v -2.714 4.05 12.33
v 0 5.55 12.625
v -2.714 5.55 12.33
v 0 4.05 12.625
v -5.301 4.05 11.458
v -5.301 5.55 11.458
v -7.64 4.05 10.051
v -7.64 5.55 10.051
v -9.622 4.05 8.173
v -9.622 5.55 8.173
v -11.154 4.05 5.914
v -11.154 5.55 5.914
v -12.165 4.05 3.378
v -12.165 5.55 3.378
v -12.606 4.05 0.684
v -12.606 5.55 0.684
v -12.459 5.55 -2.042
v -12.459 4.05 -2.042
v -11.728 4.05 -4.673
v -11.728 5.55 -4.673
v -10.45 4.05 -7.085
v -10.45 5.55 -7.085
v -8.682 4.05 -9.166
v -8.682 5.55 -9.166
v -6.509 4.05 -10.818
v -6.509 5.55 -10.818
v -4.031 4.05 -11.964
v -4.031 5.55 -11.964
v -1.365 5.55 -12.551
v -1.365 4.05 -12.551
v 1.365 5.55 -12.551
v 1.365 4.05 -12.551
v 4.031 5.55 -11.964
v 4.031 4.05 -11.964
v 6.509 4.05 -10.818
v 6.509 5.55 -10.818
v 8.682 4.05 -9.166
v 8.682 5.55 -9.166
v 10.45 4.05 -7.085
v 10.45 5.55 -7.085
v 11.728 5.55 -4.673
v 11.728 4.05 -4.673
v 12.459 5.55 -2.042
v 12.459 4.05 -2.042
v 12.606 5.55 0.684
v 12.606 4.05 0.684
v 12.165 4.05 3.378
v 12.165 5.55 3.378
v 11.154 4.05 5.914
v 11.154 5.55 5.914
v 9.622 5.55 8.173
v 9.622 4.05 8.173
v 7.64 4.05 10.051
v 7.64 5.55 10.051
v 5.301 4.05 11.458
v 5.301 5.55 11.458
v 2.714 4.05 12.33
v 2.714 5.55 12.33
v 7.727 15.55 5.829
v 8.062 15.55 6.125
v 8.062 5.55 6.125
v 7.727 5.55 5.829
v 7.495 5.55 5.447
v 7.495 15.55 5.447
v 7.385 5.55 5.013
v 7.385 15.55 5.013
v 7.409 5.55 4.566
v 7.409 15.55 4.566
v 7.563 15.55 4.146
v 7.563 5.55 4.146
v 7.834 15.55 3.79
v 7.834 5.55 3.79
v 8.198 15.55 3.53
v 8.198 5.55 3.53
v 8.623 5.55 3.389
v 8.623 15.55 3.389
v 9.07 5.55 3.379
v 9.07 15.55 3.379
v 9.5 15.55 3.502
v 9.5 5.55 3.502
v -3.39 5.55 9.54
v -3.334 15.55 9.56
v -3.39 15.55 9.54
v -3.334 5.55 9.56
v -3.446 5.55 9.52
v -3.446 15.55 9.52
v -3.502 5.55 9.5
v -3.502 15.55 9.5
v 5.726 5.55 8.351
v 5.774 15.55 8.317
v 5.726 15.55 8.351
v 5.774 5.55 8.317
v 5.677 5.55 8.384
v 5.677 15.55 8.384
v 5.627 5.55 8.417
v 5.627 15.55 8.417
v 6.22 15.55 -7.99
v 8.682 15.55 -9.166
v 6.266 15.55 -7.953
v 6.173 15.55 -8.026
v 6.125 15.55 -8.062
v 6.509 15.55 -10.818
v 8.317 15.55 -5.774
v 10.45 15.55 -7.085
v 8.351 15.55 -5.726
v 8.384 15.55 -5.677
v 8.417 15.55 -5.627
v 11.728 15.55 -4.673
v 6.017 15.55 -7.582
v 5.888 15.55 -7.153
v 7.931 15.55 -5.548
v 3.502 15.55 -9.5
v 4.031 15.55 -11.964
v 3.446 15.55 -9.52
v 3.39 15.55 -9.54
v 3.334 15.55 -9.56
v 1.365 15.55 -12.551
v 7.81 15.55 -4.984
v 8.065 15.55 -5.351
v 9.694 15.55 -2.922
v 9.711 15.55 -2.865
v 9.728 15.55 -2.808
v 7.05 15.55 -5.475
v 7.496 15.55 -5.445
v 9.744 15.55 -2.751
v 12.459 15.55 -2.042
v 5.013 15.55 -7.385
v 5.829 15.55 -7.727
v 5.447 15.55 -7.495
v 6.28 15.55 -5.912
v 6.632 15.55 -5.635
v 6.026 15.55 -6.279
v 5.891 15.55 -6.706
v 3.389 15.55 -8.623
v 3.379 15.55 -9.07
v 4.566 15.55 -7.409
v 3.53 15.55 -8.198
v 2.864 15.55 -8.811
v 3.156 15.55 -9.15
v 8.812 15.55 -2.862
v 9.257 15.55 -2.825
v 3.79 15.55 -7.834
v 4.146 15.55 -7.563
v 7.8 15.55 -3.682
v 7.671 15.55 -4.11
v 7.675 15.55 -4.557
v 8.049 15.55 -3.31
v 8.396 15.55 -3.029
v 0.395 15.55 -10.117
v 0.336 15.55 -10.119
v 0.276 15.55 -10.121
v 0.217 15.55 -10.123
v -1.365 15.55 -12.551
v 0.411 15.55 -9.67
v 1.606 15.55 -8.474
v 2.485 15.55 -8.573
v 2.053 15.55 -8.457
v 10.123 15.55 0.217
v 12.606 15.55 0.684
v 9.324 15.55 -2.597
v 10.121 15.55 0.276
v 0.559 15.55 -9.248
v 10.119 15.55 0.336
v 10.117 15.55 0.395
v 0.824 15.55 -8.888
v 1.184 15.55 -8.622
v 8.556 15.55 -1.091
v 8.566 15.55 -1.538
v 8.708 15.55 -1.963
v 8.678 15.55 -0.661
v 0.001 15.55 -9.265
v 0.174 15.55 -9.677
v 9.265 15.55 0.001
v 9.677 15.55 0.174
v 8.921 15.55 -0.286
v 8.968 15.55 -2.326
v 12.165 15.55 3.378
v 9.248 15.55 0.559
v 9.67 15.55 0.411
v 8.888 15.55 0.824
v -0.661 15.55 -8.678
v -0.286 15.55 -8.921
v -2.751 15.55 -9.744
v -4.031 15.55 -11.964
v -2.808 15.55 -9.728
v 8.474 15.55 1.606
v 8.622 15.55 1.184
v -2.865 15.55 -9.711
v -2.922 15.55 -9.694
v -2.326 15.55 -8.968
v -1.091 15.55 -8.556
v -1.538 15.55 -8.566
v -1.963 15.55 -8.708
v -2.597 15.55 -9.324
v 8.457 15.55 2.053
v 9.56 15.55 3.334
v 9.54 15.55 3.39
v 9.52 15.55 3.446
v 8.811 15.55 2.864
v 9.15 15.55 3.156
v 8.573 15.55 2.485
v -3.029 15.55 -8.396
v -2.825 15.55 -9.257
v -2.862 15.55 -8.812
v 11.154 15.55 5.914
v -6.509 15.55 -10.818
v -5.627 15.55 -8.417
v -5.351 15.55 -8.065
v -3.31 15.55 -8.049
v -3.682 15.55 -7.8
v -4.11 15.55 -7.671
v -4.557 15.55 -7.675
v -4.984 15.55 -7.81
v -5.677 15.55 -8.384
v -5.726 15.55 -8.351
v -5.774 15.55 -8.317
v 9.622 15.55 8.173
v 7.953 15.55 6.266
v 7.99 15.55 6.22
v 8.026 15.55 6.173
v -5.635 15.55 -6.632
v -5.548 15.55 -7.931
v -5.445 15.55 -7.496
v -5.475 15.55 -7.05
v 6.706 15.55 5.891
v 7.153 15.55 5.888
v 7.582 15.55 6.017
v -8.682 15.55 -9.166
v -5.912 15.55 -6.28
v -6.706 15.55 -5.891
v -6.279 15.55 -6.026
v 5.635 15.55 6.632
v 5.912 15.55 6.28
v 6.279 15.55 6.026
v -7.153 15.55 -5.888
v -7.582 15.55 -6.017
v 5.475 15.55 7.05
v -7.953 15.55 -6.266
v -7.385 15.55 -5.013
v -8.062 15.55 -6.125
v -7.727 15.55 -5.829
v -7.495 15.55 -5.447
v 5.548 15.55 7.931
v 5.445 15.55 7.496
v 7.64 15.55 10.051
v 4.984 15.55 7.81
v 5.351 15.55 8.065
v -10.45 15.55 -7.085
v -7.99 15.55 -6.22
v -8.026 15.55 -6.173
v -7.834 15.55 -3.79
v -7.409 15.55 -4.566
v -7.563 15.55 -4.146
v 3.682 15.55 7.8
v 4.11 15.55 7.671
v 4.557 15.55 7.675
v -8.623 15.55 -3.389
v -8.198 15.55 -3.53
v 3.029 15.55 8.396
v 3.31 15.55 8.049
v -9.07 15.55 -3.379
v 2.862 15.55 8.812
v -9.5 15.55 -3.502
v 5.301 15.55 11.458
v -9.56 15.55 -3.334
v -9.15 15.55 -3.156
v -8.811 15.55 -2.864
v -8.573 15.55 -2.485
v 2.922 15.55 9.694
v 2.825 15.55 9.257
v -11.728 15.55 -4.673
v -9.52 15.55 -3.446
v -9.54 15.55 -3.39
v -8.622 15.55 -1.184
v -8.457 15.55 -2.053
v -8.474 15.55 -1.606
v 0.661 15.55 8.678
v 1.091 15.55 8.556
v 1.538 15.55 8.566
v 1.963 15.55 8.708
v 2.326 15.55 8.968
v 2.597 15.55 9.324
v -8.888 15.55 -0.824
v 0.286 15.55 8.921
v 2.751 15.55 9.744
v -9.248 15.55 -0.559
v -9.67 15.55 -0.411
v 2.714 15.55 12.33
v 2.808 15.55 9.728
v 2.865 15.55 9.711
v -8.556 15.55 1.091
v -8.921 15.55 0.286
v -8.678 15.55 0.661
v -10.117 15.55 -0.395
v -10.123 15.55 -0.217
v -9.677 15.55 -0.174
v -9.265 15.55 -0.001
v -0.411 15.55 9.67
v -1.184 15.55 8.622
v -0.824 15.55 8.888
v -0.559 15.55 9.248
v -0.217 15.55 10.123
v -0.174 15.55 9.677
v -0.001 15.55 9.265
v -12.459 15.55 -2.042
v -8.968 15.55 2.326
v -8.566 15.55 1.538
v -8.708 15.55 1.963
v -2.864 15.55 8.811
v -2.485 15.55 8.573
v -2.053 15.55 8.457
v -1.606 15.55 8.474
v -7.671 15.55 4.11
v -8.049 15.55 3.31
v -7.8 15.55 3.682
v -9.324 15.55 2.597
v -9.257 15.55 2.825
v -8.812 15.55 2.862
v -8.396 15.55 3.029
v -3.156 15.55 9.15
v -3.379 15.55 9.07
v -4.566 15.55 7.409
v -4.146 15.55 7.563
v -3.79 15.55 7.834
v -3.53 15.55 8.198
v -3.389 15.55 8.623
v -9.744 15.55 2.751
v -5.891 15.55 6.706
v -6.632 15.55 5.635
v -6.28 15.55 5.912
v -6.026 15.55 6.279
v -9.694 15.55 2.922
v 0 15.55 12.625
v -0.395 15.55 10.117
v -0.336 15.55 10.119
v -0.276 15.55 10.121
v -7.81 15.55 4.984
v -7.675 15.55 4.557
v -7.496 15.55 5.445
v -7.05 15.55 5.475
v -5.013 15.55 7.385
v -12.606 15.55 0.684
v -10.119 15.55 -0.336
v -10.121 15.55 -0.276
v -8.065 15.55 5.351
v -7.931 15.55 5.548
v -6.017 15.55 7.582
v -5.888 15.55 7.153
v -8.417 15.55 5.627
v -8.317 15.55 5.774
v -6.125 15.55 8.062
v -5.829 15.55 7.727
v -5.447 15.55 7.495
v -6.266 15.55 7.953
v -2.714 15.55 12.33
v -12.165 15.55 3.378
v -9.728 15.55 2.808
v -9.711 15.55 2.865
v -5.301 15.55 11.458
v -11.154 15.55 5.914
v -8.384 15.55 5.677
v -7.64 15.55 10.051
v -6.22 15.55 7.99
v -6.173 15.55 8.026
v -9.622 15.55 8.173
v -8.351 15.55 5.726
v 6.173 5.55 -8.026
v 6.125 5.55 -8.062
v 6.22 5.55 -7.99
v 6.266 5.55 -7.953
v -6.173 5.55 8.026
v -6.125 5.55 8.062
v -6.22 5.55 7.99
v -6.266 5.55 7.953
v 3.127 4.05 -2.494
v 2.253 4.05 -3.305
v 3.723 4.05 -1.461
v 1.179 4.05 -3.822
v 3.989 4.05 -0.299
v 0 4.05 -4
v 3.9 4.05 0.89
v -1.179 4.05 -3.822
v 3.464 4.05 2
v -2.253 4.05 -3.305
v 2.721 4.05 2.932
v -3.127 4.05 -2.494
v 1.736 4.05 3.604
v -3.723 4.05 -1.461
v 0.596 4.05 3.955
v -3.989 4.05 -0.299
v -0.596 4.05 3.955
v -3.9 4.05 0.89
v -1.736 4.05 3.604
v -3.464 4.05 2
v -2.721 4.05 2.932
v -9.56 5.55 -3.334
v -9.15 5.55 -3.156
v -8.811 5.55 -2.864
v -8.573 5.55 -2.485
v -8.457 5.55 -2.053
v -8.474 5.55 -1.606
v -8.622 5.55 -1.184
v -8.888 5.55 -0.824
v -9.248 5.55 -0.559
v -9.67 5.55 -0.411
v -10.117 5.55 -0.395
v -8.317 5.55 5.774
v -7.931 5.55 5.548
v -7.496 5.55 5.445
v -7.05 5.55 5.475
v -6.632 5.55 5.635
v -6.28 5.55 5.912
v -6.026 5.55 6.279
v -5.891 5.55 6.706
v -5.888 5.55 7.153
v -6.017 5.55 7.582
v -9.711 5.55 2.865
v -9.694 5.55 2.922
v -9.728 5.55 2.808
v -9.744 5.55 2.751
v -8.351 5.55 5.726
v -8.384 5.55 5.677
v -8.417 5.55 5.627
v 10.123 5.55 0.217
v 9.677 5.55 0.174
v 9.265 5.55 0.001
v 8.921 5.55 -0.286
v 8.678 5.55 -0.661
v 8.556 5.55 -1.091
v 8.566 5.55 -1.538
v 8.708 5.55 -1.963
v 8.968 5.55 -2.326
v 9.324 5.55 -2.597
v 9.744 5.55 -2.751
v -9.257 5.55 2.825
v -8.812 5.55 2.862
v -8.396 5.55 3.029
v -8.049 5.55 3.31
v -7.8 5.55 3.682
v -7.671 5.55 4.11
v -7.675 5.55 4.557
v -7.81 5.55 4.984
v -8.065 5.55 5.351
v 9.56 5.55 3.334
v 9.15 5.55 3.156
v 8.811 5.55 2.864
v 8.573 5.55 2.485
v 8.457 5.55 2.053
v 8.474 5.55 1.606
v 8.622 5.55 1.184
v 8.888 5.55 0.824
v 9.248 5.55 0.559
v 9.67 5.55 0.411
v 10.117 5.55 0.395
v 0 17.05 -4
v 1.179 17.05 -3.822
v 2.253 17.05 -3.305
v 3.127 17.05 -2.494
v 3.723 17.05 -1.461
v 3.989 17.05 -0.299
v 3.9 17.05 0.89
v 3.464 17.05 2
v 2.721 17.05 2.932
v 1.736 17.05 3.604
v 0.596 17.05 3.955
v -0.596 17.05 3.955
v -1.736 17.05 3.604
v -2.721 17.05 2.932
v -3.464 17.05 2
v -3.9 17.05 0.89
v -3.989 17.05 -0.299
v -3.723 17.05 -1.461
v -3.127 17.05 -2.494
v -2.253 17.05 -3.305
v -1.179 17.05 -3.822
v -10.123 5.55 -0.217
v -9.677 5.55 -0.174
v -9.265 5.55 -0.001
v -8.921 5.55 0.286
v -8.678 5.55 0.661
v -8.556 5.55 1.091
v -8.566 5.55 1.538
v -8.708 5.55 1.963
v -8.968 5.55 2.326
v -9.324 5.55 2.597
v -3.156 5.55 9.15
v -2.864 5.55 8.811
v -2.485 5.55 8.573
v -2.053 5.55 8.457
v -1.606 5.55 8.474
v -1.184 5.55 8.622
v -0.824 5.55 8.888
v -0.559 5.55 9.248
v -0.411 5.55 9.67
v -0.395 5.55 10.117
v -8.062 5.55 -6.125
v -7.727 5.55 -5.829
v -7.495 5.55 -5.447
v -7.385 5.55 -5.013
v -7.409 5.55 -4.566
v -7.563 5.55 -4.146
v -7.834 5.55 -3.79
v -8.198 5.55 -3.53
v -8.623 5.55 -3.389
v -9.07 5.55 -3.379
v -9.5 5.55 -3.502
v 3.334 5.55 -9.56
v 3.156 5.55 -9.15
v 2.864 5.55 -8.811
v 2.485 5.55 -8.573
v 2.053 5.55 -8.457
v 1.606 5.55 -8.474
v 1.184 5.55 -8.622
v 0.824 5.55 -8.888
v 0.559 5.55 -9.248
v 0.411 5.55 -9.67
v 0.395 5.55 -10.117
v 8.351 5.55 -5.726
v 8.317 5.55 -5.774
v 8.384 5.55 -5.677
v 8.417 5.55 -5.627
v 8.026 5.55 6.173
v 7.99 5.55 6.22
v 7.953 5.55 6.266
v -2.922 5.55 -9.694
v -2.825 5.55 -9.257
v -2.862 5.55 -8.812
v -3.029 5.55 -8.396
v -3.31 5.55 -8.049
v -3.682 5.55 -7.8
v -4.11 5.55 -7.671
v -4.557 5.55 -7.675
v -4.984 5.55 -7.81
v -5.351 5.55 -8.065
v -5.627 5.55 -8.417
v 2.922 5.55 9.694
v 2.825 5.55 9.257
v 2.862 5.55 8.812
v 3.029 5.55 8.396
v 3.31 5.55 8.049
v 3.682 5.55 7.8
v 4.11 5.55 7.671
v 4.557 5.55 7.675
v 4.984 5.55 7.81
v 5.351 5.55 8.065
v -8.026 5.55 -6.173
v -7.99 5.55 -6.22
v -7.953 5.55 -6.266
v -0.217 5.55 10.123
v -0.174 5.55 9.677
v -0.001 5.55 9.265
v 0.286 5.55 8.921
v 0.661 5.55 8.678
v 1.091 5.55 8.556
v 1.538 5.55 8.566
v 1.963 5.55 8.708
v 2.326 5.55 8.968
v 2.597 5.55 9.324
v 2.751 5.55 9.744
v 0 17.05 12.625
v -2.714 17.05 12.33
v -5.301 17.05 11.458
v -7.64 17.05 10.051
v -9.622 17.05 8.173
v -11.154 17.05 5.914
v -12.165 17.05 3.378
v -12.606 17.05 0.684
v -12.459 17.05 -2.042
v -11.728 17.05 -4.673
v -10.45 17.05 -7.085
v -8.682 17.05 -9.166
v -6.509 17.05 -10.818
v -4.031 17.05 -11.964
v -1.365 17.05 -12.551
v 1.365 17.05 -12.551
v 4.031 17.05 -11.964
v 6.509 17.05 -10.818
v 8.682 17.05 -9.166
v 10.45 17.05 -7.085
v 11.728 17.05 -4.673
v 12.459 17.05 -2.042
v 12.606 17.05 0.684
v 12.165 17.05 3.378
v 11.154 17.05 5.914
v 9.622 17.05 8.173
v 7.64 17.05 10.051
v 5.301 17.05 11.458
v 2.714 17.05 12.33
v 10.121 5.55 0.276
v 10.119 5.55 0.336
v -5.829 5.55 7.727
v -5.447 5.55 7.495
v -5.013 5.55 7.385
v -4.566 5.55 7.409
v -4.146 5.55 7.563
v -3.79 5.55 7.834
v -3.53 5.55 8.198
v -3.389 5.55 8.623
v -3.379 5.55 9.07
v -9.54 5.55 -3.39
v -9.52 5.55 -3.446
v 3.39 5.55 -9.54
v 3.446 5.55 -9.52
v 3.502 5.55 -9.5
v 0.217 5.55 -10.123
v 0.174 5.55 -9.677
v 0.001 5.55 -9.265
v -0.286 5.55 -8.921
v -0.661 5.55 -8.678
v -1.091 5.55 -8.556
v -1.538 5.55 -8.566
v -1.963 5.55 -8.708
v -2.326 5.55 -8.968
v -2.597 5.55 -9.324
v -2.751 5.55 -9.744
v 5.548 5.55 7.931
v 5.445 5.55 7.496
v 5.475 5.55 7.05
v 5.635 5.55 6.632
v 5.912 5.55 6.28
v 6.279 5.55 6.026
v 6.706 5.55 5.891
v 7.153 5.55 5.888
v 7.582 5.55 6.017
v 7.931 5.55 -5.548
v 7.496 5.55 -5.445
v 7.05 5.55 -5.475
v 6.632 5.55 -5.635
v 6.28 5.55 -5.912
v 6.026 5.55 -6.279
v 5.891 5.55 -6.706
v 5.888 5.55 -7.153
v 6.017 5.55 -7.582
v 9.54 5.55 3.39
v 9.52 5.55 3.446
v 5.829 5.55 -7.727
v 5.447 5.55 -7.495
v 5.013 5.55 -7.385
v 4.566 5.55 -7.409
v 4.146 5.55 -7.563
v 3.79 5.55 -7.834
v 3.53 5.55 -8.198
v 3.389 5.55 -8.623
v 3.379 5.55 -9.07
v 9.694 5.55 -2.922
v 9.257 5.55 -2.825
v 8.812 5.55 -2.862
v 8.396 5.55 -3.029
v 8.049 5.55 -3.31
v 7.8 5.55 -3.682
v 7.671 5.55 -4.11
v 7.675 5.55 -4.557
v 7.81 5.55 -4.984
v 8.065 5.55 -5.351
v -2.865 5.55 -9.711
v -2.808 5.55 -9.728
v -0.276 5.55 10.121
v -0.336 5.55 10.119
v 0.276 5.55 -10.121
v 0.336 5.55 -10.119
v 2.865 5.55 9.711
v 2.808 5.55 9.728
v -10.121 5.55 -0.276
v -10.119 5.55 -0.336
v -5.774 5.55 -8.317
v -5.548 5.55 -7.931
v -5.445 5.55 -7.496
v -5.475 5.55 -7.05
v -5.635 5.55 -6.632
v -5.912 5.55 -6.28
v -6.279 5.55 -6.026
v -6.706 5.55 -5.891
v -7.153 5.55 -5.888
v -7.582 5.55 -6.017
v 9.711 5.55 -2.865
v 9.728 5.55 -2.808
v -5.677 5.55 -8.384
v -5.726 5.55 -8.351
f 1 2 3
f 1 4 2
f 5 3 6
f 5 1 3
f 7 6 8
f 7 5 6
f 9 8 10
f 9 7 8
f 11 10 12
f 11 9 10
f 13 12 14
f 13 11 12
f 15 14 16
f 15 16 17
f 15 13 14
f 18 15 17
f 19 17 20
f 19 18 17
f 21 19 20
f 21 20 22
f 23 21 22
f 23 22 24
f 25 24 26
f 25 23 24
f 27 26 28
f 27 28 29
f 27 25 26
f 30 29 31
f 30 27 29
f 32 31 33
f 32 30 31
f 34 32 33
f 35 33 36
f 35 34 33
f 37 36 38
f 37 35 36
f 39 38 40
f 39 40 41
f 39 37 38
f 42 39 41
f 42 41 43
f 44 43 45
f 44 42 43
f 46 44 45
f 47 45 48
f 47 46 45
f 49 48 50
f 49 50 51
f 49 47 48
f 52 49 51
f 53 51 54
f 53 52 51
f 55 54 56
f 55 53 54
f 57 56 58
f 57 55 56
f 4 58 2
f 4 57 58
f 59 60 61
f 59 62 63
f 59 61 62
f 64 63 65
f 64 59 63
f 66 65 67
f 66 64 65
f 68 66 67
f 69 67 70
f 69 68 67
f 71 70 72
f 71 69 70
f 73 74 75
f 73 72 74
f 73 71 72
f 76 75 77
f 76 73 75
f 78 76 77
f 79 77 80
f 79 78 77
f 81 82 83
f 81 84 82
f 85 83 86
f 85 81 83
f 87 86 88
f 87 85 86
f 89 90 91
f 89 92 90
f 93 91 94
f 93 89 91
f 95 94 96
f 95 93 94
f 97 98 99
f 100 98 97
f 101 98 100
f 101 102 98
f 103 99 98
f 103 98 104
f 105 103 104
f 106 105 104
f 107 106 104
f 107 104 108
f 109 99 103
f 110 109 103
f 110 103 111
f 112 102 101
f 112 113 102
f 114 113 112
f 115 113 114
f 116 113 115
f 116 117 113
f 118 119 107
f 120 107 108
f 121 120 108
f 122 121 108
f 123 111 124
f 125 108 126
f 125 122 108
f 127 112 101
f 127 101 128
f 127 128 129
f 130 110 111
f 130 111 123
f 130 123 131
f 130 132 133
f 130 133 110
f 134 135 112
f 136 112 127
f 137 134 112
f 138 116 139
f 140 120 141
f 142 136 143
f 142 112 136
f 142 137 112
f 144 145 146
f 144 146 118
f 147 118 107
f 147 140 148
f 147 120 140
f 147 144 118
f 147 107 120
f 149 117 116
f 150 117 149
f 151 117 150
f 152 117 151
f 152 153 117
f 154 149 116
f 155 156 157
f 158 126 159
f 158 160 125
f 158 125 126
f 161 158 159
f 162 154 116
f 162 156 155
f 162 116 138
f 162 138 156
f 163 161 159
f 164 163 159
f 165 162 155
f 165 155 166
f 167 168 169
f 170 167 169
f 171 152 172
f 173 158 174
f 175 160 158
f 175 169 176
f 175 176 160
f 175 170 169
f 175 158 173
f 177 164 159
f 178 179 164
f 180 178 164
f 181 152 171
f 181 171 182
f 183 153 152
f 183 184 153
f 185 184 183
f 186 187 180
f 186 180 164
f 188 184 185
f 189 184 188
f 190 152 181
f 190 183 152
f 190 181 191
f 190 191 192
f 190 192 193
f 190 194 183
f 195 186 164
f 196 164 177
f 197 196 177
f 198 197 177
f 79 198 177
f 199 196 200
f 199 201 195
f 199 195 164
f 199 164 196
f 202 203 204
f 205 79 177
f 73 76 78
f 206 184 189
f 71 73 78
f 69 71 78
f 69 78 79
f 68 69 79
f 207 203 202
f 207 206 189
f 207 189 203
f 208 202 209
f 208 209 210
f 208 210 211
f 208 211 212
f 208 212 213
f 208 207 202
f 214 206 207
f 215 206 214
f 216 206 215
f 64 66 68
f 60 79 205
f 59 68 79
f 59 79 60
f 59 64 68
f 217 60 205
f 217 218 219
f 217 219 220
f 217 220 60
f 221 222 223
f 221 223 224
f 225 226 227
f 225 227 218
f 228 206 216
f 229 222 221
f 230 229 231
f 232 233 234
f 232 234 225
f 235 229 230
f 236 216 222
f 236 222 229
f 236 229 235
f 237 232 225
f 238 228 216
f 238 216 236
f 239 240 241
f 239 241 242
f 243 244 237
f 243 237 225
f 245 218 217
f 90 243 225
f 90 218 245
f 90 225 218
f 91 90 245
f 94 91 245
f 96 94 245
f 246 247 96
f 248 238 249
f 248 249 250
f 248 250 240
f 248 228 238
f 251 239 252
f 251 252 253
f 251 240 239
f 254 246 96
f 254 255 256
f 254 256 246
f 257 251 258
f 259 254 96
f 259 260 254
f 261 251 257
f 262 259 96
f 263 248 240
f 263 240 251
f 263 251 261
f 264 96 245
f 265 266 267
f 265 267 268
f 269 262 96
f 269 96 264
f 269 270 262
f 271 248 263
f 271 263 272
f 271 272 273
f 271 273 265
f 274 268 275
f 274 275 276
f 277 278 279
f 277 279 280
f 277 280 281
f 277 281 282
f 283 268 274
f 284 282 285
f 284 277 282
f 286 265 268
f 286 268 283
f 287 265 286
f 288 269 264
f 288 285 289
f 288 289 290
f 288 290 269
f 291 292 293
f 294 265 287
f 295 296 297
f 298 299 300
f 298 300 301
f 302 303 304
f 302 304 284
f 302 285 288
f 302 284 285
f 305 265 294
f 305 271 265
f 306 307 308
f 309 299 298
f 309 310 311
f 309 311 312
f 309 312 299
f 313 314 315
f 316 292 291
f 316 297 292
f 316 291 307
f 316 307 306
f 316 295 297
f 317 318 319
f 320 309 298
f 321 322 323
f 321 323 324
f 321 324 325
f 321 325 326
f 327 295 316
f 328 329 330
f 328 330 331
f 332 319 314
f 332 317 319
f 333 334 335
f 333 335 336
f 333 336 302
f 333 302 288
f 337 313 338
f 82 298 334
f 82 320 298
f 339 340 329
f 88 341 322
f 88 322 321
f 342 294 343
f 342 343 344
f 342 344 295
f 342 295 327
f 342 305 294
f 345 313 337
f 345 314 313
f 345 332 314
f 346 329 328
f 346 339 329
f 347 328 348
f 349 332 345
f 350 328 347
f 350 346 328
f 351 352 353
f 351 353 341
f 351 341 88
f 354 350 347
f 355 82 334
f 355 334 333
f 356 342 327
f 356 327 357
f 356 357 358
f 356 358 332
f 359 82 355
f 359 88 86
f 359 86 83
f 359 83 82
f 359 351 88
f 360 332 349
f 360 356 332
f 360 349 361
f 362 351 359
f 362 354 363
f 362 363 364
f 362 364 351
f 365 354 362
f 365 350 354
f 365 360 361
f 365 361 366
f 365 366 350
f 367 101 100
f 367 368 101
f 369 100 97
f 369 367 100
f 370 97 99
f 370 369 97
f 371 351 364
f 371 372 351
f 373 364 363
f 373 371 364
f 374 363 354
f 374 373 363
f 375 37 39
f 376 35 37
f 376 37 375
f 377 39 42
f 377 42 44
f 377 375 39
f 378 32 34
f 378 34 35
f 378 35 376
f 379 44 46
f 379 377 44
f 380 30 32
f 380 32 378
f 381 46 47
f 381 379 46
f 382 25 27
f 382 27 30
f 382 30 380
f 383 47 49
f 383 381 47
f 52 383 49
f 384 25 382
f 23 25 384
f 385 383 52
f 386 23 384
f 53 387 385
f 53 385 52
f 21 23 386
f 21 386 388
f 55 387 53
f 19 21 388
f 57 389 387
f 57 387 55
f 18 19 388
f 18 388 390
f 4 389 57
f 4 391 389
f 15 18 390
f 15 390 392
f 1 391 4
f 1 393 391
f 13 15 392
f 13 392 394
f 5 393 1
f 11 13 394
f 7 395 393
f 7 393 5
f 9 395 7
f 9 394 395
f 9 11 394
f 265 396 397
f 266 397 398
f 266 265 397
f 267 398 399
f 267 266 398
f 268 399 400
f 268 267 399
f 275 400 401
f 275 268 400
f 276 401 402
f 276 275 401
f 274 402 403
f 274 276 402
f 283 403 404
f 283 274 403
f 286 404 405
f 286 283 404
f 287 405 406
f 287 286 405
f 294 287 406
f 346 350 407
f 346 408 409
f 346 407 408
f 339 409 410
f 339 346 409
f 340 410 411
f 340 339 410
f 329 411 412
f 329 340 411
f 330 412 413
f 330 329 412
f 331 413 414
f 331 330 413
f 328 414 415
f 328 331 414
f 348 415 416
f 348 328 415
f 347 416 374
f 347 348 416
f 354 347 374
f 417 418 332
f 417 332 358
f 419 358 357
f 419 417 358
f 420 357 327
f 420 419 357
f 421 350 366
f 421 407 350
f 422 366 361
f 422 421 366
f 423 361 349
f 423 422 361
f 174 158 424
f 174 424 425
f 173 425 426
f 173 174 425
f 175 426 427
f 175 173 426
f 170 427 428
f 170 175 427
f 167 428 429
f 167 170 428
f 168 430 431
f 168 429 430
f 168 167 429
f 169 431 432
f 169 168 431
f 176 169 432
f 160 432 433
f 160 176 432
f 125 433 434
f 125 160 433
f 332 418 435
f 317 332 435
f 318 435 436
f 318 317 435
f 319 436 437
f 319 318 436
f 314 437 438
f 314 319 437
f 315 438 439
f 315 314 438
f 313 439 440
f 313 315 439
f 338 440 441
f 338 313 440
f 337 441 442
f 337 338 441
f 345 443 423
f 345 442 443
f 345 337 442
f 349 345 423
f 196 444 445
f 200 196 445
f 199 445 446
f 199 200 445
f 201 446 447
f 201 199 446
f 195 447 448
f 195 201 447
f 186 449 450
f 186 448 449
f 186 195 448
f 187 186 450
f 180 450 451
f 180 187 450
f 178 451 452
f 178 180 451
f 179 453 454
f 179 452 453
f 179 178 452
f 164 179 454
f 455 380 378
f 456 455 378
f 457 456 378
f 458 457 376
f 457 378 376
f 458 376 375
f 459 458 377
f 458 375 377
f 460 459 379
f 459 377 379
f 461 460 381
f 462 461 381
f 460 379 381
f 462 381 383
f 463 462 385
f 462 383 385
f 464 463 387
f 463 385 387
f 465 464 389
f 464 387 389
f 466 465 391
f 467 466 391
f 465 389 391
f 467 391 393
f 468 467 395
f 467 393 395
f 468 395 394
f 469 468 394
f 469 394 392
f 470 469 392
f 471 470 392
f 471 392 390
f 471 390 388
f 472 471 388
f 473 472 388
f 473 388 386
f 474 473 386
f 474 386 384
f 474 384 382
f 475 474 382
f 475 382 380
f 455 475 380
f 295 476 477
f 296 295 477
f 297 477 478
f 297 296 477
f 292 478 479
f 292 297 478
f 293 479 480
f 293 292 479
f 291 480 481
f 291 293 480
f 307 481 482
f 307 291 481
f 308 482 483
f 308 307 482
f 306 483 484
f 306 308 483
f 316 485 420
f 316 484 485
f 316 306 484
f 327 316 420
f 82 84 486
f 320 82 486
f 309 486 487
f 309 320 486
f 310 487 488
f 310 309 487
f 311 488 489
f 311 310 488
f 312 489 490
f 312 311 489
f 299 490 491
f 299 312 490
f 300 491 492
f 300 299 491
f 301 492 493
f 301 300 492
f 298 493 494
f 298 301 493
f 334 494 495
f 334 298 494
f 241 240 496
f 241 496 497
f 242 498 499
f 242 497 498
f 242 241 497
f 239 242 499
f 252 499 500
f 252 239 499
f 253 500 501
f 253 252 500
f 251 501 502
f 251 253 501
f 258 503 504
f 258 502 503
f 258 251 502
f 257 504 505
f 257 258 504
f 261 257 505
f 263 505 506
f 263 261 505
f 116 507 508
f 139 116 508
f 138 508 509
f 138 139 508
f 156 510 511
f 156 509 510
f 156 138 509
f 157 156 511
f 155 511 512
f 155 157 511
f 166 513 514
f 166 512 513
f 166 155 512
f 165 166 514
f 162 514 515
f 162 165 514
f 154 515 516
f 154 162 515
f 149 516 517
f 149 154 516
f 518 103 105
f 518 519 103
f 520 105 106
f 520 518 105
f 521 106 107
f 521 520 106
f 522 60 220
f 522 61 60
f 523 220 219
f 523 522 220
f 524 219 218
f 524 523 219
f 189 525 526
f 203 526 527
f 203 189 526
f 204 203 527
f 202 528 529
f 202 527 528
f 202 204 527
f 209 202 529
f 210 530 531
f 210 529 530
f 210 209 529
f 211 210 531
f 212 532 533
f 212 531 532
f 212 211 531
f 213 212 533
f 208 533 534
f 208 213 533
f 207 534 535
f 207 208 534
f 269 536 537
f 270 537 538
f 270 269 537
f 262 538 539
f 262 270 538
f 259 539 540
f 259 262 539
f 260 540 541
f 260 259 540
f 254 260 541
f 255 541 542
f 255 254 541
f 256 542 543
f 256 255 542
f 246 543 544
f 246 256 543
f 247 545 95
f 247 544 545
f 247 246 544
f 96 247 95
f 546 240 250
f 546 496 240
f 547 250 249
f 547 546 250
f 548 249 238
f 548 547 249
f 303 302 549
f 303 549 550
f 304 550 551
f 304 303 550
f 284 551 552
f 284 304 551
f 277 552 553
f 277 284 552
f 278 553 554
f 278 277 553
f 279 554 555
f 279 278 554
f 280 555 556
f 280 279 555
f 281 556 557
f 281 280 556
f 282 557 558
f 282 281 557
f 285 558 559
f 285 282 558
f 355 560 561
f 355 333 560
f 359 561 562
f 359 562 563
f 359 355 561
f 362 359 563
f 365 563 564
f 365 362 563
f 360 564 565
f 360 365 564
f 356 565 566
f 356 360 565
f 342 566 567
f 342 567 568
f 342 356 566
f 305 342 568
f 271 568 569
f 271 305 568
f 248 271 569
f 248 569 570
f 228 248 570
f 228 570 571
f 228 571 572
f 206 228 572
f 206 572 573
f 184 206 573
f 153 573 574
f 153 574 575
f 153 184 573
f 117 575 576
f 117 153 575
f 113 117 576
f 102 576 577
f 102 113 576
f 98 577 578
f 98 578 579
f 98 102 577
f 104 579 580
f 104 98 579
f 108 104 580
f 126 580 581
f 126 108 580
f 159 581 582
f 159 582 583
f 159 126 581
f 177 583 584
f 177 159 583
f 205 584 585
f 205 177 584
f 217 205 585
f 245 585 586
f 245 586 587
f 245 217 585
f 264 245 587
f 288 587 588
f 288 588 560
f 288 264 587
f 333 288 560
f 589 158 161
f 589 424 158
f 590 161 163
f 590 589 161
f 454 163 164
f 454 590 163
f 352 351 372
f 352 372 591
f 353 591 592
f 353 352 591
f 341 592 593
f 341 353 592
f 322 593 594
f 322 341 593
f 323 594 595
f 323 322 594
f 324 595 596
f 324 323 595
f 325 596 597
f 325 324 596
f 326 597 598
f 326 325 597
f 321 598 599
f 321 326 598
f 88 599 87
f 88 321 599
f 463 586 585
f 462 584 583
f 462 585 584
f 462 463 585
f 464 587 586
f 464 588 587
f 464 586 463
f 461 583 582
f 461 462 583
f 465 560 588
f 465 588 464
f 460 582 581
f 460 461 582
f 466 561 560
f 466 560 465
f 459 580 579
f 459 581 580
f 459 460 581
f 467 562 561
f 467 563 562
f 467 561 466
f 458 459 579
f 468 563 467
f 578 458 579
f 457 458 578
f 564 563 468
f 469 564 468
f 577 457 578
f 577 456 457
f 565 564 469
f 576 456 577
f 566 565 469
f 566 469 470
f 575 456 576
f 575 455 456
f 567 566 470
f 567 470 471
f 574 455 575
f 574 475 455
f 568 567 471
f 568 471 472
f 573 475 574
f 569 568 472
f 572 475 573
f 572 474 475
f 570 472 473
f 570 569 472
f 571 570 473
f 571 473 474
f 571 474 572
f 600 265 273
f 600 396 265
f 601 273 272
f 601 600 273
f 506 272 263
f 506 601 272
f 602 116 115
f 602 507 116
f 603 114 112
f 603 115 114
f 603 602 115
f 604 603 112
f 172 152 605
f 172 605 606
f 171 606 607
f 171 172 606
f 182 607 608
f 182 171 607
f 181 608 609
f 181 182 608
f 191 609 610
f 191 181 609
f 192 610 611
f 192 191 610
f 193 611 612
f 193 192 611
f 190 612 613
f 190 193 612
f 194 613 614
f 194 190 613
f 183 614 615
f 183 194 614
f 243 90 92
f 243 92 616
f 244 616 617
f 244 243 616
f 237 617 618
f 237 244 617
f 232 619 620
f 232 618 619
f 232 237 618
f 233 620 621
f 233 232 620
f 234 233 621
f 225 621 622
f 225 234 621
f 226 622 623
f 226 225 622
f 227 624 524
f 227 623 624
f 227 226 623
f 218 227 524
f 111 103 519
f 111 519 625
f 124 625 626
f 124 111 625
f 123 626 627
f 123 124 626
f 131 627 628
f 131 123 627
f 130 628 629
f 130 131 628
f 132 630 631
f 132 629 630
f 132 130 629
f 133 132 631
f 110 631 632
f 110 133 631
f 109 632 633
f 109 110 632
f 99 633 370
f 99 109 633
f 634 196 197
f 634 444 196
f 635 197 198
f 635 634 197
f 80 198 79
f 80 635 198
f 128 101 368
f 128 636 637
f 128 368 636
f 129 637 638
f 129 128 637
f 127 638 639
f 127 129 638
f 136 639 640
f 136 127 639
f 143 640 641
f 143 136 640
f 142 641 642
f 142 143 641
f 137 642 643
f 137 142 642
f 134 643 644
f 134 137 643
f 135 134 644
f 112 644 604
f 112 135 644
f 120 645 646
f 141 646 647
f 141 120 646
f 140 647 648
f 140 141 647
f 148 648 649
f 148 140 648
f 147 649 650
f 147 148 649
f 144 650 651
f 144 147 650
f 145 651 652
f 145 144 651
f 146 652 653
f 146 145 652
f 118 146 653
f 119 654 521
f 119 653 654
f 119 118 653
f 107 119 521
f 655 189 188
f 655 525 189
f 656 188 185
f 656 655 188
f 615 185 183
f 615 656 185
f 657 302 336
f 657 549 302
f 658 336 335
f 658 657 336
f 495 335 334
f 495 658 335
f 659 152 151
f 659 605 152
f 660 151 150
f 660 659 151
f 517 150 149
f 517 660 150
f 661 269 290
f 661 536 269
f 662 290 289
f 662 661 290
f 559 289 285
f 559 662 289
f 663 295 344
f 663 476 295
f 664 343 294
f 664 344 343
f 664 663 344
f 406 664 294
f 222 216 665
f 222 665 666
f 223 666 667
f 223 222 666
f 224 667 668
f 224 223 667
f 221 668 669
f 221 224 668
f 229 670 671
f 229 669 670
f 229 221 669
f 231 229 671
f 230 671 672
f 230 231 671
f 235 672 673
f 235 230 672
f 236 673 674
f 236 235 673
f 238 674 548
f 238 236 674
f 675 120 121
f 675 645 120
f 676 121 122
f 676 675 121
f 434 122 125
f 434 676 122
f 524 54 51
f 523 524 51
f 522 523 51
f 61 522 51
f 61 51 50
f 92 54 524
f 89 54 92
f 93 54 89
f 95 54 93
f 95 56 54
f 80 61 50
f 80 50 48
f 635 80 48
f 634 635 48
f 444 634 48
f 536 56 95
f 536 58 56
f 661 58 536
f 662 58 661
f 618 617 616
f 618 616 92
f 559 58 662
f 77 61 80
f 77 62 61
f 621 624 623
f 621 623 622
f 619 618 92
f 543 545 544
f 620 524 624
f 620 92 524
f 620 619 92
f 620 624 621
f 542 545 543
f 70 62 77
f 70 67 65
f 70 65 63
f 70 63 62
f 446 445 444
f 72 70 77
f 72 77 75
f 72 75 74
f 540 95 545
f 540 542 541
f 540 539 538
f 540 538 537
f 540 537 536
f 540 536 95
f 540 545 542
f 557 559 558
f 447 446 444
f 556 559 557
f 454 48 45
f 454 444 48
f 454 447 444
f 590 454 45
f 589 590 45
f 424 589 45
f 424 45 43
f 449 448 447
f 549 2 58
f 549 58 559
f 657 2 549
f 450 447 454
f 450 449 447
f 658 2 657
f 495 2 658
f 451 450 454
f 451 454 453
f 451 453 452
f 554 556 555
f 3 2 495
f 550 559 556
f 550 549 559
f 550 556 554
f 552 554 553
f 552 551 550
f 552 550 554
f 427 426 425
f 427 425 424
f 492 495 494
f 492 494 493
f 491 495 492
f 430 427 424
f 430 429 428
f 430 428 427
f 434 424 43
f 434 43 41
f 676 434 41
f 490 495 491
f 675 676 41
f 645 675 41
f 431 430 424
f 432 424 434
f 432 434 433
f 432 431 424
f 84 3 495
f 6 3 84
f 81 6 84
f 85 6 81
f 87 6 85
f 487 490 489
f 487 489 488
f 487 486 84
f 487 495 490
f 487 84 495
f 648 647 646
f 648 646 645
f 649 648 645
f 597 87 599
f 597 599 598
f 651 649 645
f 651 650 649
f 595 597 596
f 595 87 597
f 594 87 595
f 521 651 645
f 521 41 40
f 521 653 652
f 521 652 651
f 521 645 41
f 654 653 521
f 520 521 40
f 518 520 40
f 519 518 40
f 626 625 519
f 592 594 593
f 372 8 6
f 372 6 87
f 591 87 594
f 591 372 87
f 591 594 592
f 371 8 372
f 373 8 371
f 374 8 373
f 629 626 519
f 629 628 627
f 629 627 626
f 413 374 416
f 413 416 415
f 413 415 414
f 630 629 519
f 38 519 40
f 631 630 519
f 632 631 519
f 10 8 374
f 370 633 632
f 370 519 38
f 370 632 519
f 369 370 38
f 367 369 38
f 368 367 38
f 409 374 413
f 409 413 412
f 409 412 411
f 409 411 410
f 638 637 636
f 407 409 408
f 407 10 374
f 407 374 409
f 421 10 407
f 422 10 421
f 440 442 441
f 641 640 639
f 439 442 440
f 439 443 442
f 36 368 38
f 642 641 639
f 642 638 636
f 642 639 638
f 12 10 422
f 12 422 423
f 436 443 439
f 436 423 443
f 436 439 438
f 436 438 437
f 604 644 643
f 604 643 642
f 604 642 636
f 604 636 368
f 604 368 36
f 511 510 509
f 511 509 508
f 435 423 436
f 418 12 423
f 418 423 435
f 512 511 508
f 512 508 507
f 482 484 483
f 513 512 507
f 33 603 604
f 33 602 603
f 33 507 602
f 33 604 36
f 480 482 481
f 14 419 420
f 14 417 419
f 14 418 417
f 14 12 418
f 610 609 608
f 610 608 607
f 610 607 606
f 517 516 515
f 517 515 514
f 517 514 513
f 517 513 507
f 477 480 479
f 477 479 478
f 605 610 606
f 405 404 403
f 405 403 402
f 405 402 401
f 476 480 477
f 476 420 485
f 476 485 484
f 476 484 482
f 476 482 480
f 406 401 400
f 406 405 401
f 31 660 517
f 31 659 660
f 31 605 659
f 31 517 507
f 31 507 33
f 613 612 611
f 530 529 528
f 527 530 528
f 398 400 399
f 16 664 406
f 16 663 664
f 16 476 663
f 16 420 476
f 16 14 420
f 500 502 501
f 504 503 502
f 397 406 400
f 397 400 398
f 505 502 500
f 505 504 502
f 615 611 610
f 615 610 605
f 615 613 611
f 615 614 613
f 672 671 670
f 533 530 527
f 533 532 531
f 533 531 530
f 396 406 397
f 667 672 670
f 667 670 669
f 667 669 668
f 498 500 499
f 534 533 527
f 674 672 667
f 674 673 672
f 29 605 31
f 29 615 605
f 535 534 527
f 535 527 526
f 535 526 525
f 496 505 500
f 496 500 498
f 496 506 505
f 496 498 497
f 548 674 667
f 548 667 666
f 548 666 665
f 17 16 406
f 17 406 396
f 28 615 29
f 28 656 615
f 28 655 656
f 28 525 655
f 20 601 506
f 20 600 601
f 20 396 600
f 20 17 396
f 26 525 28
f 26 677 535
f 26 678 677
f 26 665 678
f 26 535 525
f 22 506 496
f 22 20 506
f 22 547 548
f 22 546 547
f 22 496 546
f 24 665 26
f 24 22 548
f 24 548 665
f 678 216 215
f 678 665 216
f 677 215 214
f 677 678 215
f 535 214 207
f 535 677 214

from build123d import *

# Parameters (mm, degrees)
SKETCH_2_R               = 1.5
CUT_EXTRUDE_3_DEPTH      = 10
PATTERN_CIRCULAR_2_COUNT = 20
SKETCH_3_R               = 4
CUT_EXTRUDE_4_DEPTH      = 23.085770306


with BuildPart() as part:
    # 草图1 → 旋转1 (revolve)
    with BuildSketch(Plane(origin=(0, 0, 0), x_dir=(0, 0, -1), z_dir=(1, 0, 0))):
        Polygon((0, 4.050451807), (0, 17.050451807), (-12.625, 17.050451807), (-12.625, 15.550451807), (-10.125, 15.550451807), (-10.125, 5.550451807), (-12.625, 5.550451807), (-12.625, 4.050451807), align=None)
    revolve(axis=Axis((0, 33.241716867, 0), (0, -1, 0)))

    # 草图2 → 切除-拉伸3 (cut)
    with BuildSketch(Plane.XZ.offset(-15.550451807)):
        with Locations((-10.043642365, 1.280965666)):
            Circle(SKETCH_2_R)
    cut_extrude_3 = extrude(amount=CUT_EXTRUDE_3_DEPTH, mode=Mode.SUBTRACT)

    # 阵列(圆周)2: 切除-拉伸3 ×20 about axis
    pattern_circular_2_axis = Axis((0, 0, 0), (0, 1, 0))
    for i in range(1, PATTERN_CIRCULAR_2_COUNT):
        add(cut_extrude_3.rotate(pattern_circular_2_axis, i * 360 / PATTERN_CIRCULAR_2_COUNT), mode=Mode.SUBTRACT)

    # 草图3 → 切除-拉伸4 (cut, through all)
    with BuildSketch(Plane.XZ.offset(-4.050451807)):
        with Locations(Location((0, 0, 0), (0, 0, 270))):
            Circle(SKETCH_3_R)
    extrude(amount=-CUT_EXTRUDE_4_DEPTH, mode=Mode.SUBTRACT)


solid = part.part
